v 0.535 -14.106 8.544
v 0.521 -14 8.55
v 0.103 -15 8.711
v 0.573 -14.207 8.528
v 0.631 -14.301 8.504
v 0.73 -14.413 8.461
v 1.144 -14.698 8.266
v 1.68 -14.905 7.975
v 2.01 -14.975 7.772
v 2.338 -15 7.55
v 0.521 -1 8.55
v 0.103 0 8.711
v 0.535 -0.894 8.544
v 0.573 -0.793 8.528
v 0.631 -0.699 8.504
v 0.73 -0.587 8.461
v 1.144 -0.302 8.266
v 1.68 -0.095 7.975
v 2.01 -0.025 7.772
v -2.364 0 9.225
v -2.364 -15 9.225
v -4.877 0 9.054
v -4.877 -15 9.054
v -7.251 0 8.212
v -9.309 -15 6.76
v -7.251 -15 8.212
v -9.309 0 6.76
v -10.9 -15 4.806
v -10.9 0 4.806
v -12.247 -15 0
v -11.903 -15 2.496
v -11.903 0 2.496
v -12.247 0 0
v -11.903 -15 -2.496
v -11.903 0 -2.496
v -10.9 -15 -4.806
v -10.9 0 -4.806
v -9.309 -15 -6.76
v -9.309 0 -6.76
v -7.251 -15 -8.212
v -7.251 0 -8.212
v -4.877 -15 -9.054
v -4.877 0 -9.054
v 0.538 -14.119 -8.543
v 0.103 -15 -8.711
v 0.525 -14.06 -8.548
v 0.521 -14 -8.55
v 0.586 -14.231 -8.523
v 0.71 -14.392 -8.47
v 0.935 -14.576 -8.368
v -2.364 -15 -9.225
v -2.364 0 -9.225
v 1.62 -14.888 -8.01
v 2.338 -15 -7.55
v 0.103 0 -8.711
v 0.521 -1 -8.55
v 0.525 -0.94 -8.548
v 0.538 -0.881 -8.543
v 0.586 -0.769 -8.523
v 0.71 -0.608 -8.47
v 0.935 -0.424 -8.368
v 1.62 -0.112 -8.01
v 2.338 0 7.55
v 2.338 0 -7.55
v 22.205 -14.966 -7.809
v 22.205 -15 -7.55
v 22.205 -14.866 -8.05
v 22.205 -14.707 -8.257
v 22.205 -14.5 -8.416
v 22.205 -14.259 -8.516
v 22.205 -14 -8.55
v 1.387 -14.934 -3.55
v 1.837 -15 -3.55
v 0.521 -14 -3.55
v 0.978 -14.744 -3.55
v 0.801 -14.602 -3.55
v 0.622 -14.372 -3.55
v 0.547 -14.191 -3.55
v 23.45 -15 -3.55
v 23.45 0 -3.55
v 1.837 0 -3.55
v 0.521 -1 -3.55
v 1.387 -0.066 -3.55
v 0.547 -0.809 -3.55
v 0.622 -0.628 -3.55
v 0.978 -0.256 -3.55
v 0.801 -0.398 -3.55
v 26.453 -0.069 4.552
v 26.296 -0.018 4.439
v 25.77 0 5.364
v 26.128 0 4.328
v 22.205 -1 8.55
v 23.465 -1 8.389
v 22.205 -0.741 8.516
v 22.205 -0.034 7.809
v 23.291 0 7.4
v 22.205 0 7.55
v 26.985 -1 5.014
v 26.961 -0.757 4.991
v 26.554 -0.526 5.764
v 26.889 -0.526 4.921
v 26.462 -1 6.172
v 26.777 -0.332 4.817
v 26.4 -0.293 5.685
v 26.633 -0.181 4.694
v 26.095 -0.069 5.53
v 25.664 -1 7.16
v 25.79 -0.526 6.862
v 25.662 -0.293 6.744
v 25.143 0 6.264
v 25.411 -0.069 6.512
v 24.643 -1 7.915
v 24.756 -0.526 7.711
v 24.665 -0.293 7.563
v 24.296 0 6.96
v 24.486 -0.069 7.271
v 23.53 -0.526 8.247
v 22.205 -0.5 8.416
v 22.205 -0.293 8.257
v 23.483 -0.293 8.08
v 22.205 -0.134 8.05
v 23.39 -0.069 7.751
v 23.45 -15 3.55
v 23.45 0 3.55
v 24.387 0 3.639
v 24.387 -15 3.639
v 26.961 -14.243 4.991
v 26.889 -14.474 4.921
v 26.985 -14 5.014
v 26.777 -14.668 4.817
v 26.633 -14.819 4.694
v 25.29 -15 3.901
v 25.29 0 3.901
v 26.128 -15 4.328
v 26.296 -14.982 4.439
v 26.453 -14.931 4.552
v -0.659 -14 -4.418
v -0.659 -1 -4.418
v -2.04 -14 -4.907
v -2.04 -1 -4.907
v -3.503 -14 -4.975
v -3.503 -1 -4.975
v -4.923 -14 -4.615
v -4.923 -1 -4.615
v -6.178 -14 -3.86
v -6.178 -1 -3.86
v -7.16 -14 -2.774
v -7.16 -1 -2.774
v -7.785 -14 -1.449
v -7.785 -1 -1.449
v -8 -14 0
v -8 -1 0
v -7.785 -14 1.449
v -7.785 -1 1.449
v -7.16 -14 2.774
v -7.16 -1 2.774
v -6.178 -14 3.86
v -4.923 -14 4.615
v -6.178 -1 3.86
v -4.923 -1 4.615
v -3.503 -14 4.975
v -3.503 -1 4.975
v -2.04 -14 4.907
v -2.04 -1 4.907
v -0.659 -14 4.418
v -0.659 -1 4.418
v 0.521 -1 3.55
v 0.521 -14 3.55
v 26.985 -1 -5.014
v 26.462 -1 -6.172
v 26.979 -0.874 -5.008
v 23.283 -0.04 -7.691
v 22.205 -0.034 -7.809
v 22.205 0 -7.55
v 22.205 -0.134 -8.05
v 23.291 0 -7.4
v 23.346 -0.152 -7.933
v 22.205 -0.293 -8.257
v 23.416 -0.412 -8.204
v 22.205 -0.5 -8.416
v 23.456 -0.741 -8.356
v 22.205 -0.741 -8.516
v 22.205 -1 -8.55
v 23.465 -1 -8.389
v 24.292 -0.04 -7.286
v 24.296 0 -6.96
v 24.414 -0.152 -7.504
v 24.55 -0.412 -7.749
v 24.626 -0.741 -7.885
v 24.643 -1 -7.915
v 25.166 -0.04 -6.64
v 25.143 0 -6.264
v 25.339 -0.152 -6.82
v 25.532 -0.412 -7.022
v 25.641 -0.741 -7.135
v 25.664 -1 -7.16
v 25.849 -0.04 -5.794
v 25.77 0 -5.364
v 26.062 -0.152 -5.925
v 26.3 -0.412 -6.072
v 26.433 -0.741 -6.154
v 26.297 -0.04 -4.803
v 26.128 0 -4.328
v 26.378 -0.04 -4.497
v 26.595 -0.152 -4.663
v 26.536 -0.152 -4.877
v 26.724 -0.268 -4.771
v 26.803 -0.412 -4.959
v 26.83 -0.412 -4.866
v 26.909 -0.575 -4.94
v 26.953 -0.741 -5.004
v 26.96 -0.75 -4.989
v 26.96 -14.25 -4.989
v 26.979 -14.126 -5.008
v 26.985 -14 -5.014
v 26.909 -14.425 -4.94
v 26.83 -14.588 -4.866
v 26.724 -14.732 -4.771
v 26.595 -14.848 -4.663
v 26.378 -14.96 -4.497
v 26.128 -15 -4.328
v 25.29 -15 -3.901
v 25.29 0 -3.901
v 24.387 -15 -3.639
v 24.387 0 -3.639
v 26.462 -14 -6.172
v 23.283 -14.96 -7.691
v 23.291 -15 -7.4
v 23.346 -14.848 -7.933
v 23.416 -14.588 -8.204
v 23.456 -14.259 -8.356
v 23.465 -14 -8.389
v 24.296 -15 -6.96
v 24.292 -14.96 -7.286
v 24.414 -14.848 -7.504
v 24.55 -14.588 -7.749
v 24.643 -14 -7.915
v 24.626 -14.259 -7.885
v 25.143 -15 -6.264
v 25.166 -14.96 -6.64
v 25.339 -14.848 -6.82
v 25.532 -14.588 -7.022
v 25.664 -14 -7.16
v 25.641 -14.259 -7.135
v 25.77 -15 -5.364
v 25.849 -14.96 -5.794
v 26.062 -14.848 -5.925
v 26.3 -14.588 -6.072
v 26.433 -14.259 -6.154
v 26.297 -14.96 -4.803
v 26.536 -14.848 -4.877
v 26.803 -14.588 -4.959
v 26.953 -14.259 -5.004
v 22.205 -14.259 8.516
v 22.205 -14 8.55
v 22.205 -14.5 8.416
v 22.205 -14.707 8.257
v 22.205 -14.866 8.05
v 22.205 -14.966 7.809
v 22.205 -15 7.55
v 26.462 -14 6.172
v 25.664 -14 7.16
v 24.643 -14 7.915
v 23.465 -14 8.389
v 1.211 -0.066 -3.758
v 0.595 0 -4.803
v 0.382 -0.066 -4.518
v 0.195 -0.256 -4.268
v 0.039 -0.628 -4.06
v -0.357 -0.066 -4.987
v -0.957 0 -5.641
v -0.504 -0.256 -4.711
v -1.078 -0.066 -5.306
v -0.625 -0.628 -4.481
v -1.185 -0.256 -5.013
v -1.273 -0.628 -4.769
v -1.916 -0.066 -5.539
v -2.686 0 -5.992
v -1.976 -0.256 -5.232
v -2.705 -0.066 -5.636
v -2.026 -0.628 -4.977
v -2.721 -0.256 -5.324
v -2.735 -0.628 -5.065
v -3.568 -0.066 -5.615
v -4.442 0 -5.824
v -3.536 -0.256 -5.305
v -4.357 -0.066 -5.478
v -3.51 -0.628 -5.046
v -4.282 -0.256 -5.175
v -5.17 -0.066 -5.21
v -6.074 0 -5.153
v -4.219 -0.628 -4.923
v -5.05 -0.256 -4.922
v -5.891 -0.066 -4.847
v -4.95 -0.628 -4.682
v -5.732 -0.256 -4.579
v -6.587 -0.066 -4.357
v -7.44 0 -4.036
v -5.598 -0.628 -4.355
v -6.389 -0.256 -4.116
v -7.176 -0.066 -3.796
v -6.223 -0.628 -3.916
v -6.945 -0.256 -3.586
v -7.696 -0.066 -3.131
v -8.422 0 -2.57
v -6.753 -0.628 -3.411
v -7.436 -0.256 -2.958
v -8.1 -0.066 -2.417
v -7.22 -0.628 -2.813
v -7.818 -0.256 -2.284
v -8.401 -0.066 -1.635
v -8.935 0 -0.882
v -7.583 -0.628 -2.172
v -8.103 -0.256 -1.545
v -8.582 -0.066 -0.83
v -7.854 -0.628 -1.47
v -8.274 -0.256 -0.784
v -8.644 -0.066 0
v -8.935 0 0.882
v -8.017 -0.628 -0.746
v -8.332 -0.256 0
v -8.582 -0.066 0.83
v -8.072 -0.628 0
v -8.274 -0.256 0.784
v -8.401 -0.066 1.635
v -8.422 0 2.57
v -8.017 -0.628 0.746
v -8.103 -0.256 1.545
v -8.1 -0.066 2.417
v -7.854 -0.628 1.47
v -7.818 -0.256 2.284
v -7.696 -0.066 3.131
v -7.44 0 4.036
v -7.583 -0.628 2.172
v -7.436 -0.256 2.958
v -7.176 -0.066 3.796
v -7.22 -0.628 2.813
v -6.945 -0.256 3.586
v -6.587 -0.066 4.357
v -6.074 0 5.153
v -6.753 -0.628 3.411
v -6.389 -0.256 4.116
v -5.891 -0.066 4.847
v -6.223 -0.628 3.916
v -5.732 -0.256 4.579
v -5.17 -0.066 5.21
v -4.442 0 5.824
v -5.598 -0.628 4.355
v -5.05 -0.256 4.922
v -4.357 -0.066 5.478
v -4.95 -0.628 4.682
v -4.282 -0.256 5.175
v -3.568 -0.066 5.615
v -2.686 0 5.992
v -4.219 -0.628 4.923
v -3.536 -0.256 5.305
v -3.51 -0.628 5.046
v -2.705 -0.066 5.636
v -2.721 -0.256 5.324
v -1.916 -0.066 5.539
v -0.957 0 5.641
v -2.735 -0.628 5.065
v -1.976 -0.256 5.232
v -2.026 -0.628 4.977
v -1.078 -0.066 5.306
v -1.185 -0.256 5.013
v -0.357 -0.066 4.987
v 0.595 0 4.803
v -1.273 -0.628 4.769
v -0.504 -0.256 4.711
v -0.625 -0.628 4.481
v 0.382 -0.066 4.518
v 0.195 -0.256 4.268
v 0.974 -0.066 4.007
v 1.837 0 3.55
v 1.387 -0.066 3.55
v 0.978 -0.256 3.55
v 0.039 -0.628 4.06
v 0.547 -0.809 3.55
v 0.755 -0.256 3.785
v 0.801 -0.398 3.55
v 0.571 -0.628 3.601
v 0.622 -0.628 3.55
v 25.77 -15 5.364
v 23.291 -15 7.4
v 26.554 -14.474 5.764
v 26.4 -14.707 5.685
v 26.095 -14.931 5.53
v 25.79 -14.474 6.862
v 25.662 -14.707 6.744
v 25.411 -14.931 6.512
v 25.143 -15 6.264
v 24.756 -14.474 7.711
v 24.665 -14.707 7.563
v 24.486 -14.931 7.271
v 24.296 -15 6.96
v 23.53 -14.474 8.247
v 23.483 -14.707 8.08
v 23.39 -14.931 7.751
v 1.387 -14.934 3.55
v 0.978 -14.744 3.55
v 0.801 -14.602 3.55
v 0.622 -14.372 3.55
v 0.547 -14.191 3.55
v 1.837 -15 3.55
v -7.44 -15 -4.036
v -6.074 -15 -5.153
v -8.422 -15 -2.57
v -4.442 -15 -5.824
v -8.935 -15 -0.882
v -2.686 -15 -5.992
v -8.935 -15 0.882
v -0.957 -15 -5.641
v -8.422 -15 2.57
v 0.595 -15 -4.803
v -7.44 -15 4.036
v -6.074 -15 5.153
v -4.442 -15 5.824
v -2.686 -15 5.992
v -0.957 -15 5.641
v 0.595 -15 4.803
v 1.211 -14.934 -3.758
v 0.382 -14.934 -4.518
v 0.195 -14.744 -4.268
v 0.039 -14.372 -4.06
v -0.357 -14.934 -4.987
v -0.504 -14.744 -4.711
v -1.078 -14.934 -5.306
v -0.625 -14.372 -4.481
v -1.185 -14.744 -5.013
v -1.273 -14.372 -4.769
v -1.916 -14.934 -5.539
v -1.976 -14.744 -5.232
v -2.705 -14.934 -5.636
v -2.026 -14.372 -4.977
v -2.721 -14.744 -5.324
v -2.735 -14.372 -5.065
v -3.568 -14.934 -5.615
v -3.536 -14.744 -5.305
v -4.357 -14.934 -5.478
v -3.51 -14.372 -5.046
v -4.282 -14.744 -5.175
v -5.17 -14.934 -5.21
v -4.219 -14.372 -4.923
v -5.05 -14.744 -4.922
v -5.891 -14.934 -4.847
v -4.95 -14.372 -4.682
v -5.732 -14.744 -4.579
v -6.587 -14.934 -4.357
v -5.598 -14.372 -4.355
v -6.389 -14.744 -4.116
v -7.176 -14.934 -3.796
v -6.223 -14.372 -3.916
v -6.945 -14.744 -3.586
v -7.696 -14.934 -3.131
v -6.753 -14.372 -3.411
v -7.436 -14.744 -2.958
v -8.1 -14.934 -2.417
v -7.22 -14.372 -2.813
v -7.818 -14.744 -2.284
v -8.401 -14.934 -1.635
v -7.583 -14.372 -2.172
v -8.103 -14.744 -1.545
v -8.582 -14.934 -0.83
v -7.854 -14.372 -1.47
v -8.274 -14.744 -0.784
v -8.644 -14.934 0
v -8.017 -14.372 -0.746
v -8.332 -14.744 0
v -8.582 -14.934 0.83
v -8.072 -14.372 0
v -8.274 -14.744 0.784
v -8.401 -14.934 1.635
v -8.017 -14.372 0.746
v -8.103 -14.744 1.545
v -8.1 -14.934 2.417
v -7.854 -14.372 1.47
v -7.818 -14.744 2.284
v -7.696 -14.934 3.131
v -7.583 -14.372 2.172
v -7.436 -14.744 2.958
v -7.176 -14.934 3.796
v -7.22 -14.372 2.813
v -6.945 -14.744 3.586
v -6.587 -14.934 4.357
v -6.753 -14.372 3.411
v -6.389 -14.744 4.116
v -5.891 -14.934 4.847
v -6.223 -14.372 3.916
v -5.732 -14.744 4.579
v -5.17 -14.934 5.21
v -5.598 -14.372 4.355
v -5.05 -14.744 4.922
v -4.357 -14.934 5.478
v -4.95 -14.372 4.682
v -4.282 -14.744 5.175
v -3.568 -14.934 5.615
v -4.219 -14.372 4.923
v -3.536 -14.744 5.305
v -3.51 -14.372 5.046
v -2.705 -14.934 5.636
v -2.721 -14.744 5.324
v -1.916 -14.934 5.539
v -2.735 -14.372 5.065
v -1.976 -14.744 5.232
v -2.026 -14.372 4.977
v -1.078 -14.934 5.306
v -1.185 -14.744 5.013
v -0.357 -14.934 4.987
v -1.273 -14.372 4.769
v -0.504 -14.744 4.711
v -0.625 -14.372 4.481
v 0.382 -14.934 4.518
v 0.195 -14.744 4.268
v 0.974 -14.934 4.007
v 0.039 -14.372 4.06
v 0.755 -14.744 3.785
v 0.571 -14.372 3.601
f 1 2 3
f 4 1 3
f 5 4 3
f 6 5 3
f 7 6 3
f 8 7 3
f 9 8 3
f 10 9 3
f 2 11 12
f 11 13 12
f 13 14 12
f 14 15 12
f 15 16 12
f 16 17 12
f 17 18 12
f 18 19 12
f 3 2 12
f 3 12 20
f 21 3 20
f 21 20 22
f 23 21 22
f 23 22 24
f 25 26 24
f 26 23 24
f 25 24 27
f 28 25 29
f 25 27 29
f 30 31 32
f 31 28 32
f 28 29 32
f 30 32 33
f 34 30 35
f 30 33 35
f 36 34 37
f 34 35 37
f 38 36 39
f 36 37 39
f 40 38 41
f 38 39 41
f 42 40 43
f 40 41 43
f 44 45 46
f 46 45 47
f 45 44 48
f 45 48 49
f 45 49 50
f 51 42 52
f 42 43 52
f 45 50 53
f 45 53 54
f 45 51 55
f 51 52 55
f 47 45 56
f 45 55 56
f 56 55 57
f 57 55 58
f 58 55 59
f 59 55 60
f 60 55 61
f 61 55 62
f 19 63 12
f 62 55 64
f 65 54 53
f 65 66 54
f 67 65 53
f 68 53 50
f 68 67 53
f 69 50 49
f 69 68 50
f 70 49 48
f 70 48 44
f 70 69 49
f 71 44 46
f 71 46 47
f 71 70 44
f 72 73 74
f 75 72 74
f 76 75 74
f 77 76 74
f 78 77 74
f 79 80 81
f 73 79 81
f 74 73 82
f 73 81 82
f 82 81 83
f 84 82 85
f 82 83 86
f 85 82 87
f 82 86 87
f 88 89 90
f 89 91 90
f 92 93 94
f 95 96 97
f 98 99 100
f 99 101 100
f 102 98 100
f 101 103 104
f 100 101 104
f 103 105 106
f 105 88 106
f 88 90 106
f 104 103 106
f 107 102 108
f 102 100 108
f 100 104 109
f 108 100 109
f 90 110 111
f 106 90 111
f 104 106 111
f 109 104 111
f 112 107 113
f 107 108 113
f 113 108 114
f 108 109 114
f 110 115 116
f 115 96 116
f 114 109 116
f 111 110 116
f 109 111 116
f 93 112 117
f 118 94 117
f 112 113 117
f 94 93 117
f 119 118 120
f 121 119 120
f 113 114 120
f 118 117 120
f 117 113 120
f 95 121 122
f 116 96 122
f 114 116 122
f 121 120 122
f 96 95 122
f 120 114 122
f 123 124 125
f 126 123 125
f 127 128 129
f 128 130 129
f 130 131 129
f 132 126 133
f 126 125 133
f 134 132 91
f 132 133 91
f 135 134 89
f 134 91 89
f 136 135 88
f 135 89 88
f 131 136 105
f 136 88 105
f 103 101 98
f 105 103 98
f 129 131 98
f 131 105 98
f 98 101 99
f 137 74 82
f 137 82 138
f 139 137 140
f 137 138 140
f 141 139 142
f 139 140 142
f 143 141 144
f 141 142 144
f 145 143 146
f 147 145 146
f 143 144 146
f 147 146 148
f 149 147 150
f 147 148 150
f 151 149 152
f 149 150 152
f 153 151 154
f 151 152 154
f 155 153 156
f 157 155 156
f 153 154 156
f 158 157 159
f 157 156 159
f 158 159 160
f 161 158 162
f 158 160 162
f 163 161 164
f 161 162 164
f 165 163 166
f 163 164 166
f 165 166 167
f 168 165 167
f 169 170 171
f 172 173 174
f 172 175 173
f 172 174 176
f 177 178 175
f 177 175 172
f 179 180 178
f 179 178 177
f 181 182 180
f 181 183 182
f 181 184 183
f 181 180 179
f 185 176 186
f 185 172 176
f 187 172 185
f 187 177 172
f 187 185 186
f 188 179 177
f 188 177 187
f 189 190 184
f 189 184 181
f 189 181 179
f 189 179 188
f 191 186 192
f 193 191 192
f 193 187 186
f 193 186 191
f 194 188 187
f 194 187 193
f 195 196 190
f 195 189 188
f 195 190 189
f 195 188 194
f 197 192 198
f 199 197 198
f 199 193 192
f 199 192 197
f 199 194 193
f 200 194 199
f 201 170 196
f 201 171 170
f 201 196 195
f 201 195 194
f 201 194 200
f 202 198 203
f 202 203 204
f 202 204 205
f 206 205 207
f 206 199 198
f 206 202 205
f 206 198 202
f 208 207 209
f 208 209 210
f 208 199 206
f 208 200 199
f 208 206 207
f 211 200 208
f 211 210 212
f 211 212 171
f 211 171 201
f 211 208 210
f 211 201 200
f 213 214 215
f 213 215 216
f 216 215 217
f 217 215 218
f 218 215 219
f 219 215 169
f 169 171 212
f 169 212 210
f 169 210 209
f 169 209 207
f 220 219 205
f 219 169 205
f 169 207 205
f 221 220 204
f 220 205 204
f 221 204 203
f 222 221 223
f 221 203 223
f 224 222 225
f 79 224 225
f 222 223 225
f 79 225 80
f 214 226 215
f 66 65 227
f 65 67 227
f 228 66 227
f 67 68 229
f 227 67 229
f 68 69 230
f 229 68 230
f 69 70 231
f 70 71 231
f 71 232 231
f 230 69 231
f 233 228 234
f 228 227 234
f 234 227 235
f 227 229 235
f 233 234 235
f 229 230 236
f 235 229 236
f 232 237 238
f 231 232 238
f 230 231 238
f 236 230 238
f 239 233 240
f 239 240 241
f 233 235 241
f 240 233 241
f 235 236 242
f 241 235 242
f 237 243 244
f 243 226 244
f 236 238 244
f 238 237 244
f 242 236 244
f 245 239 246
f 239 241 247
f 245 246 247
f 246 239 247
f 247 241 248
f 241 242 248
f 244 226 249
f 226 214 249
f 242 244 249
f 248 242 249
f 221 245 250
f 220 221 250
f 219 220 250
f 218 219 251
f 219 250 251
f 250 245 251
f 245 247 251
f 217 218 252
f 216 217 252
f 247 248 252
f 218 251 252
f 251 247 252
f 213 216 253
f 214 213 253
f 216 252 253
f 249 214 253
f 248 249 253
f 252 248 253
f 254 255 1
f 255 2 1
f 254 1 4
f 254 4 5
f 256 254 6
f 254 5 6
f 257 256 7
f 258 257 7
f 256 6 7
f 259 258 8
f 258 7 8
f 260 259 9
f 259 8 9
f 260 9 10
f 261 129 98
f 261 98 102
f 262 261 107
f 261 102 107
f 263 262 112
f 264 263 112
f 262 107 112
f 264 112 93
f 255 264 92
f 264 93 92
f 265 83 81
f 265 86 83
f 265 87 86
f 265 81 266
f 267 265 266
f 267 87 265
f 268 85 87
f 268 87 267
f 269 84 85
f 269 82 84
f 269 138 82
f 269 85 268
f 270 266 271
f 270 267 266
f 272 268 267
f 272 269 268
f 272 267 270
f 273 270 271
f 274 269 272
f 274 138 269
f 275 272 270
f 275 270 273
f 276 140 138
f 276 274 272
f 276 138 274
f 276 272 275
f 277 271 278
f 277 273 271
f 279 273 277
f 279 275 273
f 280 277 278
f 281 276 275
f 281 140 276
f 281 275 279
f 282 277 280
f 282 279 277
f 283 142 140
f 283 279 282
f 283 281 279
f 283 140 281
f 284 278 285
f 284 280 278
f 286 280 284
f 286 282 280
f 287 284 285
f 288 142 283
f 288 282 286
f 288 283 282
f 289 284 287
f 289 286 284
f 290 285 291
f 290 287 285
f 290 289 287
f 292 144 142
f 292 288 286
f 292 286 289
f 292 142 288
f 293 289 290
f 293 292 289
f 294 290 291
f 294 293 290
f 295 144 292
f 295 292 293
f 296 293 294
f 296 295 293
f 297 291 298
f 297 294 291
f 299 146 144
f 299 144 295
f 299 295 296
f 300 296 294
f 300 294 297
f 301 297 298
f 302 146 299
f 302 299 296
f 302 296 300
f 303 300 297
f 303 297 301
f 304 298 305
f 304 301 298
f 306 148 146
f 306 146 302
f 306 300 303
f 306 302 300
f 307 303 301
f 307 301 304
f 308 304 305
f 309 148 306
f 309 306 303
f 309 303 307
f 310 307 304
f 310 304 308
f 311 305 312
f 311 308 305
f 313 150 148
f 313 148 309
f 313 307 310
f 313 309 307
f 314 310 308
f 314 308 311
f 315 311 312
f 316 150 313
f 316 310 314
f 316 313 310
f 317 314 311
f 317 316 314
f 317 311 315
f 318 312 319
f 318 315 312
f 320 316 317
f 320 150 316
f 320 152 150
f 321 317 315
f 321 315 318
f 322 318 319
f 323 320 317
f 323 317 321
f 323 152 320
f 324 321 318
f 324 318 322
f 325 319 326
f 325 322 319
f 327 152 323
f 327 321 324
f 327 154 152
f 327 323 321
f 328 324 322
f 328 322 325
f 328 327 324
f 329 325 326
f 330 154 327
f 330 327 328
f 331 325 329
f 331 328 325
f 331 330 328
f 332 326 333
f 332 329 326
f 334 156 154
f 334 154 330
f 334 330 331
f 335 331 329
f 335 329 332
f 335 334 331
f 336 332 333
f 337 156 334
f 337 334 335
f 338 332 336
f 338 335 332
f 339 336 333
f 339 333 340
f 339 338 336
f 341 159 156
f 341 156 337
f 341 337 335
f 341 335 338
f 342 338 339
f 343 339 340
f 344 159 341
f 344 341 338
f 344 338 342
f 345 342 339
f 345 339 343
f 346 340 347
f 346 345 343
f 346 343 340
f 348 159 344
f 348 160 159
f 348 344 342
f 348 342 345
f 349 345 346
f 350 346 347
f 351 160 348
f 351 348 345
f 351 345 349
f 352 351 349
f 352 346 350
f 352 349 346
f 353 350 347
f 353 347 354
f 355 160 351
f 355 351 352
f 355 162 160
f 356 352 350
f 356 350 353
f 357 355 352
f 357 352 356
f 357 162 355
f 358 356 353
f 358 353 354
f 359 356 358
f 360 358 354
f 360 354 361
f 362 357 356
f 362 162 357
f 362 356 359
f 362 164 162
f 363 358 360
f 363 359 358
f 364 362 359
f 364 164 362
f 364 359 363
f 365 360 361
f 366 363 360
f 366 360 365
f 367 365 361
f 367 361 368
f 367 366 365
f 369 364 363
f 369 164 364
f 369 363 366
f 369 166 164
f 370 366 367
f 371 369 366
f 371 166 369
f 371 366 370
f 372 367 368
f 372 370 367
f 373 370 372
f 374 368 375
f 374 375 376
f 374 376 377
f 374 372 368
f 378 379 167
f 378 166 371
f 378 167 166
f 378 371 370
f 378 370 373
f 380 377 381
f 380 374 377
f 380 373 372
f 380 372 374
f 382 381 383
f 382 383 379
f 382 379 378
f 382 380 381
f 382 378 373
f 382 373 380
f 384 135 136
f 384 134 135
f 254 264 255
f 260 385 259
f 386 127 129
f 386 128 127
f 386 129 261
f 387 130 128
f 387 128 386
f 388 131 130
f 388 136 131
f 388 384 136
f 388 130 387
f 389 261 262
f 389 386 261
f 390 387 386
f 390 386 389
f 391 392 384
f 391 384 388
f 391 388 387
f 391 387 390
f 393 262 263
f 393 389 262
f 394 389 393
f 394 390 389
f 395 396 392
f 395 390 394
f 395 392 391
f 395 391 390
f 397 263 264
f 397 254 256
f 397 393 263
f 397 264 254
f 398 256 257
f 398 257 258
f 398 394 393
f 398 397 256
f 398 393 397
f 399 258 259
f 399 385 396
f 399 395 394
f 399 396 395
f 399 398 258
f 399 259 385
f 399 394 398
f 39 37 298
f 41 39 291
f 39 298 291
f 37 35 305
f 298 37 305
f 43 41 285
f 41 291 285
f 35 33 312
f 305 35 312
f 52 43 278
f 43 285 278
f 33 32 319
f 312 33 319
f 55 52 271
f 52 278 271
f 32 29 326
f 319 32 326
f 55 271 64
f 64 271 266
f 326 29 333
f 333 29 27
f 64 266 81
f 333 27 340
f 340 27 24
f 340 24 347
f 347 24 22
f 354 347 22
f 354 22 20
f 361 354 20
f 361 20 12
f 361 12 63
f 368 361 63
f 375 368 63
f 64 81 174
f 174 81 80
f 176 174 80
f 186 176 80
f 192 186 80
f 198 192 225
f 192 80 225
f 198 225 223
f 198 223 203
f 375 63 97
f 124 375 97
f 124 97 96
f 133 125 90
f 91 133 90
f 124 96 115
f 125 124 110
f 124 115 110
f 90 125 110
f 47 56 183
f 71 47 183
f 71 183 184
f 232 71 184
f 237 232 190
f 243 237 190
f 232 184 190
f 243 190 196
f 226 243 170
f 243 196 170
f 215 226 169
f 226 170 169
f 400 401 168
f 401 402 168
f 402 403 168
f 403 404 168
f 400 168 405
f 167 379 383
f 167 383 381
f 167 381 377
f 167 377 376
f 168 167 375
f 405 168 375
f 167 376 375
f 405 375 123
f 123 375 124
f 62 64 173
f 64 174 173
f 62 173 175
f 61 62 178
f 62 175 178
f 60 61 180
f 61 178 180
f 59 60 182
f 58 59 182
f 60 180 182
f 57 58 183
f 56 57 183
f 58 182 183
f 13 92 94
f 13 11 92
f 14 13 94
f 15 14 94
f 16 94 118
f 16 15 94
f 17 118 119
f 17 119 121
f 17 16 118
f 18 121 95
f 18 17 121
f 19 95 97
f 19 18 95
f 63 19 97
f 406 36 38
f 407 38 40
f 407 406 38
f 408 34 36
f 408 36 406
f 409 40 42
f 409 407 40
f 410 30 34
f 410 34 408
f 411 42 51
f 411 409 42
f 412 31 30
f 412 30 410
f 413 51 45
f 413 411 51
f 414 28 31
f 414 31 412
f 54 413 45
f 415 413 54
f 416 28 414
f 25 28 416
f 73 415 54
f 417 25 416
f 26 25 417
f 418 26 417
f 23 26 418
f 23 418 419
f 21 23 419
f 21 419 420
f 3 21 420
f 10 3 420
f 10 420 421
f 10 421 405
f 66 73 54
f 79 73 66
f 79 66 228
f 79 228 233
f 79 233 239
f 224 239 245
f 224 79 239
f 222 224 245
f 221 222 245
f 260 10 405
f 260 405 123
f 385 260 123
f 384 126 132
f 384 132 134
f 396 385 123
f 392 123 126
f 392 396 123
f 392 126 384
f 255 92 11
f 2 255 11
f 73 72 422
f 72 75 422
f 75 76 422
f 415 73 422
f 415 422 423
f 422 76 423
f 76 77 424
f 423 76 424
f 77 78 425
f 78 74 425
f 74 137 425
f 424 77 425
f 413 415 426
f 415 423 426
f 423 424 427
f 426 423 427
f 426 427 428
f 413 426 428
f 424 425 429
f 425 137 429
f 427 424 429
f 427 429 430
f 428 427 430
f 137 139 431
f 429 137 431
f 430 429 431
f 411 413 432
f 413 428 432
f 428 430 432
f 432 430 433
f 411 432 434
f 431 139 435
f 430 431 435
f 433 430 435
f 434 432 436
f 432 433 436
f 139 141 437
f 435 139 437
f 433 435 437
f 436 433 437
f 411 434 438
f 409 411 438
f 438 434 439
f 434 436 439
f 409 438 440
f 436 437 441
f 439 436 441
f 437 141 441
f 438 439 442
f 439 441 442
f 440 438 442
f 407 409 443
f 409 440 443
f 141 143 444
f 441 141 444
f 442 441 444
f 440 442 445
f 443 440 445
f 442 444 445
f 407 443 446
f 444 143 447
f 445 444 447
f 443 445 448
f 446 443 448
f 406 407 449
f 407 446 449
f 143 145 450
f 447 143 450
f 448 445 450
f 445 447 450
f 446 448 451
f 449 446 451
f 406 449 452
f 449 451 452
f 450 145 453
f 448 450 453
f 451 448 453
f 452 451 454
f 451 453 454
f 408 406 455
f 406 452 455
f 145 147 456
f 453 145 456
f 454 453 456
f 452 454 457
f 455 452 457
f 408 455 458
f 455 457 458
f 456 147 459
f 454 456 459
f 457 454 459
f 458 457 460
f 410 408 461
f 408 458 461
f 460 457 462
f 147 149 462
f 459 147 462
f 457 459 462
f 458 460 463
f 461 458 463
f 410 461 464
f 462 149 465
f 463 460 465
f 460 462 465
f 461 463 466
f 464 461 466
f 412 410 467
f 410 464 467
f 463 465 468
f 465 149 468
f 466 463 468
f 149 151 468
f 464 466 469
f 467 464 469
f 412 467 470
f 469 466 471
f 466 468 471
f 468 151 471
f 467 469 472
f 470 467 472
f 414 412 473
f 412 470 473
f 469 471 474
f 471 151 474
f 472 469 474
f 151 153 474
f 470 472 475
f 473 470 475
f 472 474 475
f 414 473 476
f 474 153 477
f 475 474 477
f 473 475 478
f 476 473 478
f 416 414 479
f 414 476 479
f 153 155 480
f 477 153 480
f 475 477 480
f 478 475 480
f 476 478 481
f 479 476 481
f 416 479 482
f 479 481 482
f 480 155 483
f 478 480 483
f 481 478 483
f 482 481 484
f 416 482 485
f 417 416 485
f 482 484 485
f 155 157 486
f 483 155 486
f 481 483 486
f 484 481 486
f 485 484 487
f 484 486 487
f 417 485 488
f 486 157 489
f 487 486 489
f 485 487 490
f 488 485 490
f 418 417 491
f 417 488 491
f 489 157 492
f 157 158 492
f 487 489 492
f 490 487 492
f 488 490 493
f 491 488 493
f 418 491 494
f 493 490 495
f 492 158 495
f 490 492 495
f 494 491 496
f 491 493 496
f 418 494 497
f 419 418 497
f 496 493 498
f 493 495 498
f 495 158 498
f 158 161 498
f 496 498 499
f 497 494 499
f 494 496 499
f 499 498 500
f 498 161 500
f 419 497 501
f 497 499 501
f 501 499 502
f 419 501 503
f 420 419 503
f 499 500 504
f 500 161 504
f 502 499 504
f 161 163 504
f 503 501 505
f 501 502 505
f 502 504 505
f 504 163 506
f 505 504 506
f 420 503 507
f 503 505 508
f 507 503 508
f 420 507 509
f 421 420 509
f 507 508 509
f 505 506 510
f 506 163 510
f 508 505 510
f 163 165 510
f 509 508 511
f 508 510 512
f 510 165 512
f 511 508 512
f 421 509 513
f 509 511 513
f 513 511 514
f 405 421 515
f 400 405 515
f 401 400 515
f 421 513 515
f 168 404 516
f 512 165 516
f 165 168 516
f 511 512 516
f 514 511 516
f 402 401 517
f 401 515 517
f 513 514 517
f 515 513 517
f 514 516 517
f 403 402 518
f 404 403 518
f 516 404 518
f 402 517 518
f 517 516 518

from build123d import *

# Parameters (mm, degrees)
F1_DEPTH    = 15
F2_T1_DEPTH = 56.5812984693
F3_R        = 1


# Not quite as in the source:
# - a fillet or chamfer that OpenCascade refuses, or shapes differently, is made with other operations: its cross-section is extruded or revolved along the edge and cut away or added


with BuildPart() as f1:
    # F0 (on Front) → F1 (new body)
    with BuildSketch(Plane.XZ):
        with BuildLine():
            Line((30.5210083783, 8.55), (0.5210083783, 8.55))
            ThreePointArc((0.5210083783, 8.55), (-12.2466210045, 0), (0.5210083783, -8.55))
            Line((0.5210083783, -8.55), (30.5210083783, -8.55))
            Line((30.5210083783, -8.55), (26.9854744724, -5.0144660941))
            ThreePointArc((26.9854744724, -5.0144660941), (25.3633577283, -3.9306023374), (23.4499405664, -3.55))
            Line((23.4499405664, -3.55), (0.5210083783, -3.55))
            ThreePointArc((0.5210083783, -3.55), (-8, 0), (0.5210083783, 3.55))
            Line((0.5210083783, 3.55), (23.4499405664, 3.55))
            ThreePointArc((23.4499405664, 3.55), (25.3633577283, 3.9306023374), (26.9854744724, 5.0144660941))
            Line((26.9854744724, 5.0144660941), (30.5210083783, 8.55))
        make_face()
    extrude(amount=F1_DEPTH)

    # F2: fillet of radius 5 on 2 edges, made by hand

    # F2_s2 → F2_t1 (cut)
    with BuildSketch(Plane.XZ.offset(-20.7906492346)):
        with BuildLine():
            ThreePointArc((22.2047486844, -8.55), (25.1777664719, -7.5700951774), (26.9854744724, -5.0144660941))
            Line((26.9854744724, -5.0144660941), (30.5210083783, -8.55))
            Line((30.5210083783, -8.55), (22.2047486844, -8.55))
        make_face()
        with BuildLine():
            ThreePointArc((26.9854744724, 5.0144660941), (25.1777664719, 7.5700951774), (22.2047486844, 8.55))
            Line((22.2047486844, 8.55), (30.5210083783, 8.55))
            Line((30.5210083783, 8.55), (26.9854744724, 5.0144660941))
        make_face()
    extrude(amount=F2_T1_DEPTH, mode=Mode.SUBTRACT)

    # F3
    f3_edges = [f1.edges().sort_by_distance(p)[0] for p in [
        (11.362879, 0, -8.55),
        (11.362879, -15, -8.55),
        (11.362879, -15, 8.55),
        (11.362879, 0, 8.55),
        (-8, -15, 0),
        (-8, 0, 0),
        (25.177766, 0, 7.570095),
        (25.177766, -15, 7.570095),
        (25.177766, 0, -7.570095),
        (25.177766, -15, -7.570095),
    ]]
    fillet(f3_edges, radius=F3_R)


solid = f1.part
